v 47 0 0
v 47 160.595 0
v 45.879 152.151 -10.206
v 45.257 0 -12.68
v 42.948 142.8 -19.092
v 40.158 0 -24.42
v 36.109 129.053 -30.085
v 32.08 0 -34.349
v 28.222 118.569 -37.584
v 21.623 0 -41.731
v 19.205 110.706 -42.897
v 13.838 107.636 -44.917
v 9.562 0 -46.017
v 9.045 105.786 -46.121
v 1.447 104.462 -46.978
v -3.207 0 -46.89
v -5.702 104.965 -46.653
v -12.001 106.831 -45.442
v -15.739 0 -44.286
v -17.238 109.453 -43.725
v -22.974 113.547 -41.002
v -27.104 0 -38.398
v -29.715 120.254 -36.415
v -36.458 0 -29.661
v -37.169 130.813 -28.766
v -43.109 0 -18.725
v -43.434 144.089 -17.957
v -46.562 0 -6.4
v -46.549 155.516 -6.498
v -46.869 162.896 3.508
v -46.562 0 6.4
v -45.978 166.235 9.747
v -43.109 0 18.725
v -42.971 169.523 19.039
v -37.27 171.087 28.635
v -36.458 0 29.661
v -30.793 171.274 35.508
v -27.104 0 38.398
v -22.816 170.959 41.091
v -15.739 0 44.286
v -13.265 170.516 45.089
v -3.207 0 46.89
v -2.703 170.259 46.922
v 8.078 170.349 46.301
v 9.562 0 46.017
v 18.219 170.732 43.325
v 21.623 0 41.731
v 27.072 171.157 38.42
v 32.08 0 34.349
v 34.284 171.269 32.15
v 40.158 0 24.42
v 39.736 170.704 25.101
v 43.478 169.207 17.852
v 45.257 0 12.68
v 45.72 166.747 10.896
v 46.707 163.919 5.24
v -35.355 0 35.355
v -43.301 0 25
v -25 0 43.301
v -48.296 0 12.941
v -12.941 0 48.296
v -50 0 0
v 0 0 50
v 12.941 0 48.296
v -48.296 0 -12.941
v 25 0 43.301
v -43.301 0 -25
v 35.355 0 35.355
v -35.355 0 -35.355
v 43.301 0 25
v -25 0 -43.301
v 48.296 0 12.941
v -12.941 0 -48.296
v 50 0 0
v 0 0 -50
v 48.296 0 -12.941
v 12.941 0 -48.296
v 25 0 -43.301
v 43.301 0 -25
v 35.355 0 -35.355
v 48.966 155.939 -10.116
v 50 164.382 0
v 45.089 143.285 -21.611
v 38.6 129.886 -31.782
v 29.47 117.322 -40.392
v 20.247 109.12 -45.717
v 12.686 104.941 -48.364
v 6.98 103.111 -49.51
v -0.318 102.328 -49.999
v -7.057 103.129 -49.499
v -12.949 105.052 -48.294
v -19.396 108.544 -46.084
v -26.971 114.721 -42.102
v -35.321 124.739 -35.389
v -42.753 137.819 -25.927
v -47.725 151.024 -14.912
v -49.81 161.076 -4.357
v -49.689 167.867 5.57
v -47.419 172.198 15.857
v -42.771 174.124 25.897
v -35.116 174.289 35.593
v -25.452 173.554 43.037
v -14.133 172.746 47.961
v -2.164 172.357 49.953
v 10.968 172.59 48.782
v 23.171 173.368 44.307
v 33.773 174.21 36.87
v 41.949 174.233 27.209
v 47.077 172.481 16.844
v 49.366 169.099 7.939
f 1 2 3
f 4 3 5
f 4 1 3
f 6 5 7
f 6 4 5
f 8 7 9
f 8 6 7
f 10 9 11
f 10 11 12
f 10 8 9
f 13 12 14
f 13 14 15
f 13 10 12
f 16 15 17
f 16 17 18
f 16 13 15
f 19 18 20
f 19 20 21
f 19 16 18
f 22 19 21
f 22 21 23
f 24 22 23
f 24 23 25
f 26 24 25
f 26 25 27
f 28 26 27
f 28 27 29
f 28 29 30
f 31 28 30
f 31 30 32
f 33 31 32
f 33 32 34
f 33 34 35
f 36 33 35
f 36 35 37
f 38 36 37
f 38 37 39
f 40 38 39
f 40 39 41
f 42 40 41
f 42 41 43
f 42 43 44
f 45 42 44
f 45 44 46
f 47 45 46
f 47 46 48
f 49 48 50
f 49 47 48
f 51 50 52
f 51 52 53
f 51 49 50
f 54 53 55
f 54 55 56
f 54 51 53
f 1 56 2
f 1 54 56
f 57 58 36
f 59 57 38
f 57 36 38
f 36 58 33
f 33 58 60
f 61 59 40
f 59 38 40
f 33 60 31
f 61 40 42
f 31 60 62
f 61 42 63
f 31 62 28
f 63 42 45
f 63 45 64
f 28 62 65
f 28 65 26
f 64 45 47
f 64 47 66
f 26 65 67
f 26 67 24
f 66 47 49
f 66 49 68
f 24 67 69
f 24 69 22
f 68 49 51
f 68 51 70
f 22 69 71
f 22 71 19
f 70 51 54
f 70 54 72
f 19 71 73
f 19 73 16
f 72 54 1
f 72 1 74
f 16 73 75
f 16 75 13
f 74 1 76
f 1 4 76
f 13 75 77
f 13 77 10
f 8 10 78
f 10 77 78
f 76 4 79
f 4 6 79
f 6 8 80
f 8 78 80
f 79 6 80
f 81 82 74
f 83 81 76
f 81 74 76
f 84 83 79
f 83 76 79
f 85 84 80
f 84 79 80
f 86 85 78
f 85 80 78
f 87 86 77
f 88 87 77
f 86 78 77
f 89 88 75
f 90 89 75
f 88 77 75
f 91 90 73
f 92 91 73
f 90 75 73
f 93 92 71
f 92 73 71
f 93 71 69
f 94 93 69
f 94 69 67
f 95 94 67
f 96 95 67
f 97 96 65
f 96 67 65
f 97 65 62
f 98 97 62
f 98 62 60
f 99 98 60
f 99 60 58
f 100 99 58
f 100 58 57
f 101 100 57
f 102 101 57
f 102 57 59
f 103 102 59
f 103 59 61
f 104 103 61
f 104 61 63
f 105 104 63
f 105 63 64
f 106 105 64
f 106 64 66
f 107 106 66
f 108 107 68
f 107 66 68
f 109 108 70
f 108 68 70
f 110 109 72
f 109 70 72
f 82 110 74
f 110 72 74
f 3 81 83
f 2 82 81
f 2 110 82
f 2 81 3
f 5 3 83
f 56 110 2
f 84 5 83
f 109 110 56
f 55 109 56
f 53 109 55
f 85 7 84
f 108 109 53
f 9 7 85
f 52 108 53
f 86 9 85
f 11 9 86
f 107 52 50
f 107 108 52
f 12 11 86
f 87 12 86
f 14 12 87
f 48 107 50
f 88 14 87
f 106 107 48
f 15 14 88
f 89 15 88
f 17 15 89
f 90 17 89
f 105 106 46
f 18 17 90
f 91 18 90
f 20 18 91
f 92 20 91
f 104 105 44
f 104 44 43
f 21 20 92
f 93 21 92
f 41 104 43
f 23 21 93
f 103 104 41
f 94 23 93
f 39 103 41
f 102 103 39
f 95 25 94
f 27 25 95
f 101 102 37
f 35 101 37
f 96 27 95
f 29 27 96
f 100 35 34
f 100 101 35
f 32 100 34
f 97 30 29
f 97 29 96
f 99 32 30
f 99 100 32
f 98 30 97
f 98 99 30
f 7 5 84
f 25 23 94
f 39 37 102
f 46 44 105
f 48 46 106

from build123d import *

# Parameters (mm, degrees)
EXTRUDE_1_OUTLINE_R      = 50
EXTRUDE_1_OUTLINE_R_2    = 47
EXTRUDE_1_DEPTH          = 200
CUT_EXTRUDE_1_DEPTH      = 213.132034356
CUT_EXTRUDE_1_DEPTH_BACK = 213.132034356
SKETCH_2_R               = 67.5


# Read off the part's stored shape, not the designer's step: Вытянуть-Тонкостенный1
with BuildPart() as part:
    # Вытянуть-Тонкостенный1 outline → Вытянуть-Тонкостенный1 (new body)
    with BuildSketch(Plane(origin=(0, 0, 0), x_dir=(1, 0, 0), z_dir=(0, 1, 0))):
        Circle(EXTRUDE_1_OUTLINE_R)
        Circle(EXTRUDE_1_OUTLINE_R_2, mode=Mode.SUBTRACT)
    extrude(amount=EXTRUDE_1_DEPTH)

    # Эскиз2 → Вырез-Вытянуть1 (cut, two sides: drawn at the far end of the back side and taken through both)
    with BuildSketch(Plane(origin=(0, 0, 0), x_dir=(1, 0, 0), z_dir=(0, -0.5735764363510444, -0.819152044288993)).offset(-CUT_EXTRUDE_1_DEPTH_BACK)):
        with Locations((0, -180)):
            Circle(SKETCH_2_R)
    extrude(amount=CUT_EXTRUDE_1_DEPTH + CUT_EXTRUDE_1_DEPTH_BACK, mode=Mode.SUBTRACT)


solid = part.part
